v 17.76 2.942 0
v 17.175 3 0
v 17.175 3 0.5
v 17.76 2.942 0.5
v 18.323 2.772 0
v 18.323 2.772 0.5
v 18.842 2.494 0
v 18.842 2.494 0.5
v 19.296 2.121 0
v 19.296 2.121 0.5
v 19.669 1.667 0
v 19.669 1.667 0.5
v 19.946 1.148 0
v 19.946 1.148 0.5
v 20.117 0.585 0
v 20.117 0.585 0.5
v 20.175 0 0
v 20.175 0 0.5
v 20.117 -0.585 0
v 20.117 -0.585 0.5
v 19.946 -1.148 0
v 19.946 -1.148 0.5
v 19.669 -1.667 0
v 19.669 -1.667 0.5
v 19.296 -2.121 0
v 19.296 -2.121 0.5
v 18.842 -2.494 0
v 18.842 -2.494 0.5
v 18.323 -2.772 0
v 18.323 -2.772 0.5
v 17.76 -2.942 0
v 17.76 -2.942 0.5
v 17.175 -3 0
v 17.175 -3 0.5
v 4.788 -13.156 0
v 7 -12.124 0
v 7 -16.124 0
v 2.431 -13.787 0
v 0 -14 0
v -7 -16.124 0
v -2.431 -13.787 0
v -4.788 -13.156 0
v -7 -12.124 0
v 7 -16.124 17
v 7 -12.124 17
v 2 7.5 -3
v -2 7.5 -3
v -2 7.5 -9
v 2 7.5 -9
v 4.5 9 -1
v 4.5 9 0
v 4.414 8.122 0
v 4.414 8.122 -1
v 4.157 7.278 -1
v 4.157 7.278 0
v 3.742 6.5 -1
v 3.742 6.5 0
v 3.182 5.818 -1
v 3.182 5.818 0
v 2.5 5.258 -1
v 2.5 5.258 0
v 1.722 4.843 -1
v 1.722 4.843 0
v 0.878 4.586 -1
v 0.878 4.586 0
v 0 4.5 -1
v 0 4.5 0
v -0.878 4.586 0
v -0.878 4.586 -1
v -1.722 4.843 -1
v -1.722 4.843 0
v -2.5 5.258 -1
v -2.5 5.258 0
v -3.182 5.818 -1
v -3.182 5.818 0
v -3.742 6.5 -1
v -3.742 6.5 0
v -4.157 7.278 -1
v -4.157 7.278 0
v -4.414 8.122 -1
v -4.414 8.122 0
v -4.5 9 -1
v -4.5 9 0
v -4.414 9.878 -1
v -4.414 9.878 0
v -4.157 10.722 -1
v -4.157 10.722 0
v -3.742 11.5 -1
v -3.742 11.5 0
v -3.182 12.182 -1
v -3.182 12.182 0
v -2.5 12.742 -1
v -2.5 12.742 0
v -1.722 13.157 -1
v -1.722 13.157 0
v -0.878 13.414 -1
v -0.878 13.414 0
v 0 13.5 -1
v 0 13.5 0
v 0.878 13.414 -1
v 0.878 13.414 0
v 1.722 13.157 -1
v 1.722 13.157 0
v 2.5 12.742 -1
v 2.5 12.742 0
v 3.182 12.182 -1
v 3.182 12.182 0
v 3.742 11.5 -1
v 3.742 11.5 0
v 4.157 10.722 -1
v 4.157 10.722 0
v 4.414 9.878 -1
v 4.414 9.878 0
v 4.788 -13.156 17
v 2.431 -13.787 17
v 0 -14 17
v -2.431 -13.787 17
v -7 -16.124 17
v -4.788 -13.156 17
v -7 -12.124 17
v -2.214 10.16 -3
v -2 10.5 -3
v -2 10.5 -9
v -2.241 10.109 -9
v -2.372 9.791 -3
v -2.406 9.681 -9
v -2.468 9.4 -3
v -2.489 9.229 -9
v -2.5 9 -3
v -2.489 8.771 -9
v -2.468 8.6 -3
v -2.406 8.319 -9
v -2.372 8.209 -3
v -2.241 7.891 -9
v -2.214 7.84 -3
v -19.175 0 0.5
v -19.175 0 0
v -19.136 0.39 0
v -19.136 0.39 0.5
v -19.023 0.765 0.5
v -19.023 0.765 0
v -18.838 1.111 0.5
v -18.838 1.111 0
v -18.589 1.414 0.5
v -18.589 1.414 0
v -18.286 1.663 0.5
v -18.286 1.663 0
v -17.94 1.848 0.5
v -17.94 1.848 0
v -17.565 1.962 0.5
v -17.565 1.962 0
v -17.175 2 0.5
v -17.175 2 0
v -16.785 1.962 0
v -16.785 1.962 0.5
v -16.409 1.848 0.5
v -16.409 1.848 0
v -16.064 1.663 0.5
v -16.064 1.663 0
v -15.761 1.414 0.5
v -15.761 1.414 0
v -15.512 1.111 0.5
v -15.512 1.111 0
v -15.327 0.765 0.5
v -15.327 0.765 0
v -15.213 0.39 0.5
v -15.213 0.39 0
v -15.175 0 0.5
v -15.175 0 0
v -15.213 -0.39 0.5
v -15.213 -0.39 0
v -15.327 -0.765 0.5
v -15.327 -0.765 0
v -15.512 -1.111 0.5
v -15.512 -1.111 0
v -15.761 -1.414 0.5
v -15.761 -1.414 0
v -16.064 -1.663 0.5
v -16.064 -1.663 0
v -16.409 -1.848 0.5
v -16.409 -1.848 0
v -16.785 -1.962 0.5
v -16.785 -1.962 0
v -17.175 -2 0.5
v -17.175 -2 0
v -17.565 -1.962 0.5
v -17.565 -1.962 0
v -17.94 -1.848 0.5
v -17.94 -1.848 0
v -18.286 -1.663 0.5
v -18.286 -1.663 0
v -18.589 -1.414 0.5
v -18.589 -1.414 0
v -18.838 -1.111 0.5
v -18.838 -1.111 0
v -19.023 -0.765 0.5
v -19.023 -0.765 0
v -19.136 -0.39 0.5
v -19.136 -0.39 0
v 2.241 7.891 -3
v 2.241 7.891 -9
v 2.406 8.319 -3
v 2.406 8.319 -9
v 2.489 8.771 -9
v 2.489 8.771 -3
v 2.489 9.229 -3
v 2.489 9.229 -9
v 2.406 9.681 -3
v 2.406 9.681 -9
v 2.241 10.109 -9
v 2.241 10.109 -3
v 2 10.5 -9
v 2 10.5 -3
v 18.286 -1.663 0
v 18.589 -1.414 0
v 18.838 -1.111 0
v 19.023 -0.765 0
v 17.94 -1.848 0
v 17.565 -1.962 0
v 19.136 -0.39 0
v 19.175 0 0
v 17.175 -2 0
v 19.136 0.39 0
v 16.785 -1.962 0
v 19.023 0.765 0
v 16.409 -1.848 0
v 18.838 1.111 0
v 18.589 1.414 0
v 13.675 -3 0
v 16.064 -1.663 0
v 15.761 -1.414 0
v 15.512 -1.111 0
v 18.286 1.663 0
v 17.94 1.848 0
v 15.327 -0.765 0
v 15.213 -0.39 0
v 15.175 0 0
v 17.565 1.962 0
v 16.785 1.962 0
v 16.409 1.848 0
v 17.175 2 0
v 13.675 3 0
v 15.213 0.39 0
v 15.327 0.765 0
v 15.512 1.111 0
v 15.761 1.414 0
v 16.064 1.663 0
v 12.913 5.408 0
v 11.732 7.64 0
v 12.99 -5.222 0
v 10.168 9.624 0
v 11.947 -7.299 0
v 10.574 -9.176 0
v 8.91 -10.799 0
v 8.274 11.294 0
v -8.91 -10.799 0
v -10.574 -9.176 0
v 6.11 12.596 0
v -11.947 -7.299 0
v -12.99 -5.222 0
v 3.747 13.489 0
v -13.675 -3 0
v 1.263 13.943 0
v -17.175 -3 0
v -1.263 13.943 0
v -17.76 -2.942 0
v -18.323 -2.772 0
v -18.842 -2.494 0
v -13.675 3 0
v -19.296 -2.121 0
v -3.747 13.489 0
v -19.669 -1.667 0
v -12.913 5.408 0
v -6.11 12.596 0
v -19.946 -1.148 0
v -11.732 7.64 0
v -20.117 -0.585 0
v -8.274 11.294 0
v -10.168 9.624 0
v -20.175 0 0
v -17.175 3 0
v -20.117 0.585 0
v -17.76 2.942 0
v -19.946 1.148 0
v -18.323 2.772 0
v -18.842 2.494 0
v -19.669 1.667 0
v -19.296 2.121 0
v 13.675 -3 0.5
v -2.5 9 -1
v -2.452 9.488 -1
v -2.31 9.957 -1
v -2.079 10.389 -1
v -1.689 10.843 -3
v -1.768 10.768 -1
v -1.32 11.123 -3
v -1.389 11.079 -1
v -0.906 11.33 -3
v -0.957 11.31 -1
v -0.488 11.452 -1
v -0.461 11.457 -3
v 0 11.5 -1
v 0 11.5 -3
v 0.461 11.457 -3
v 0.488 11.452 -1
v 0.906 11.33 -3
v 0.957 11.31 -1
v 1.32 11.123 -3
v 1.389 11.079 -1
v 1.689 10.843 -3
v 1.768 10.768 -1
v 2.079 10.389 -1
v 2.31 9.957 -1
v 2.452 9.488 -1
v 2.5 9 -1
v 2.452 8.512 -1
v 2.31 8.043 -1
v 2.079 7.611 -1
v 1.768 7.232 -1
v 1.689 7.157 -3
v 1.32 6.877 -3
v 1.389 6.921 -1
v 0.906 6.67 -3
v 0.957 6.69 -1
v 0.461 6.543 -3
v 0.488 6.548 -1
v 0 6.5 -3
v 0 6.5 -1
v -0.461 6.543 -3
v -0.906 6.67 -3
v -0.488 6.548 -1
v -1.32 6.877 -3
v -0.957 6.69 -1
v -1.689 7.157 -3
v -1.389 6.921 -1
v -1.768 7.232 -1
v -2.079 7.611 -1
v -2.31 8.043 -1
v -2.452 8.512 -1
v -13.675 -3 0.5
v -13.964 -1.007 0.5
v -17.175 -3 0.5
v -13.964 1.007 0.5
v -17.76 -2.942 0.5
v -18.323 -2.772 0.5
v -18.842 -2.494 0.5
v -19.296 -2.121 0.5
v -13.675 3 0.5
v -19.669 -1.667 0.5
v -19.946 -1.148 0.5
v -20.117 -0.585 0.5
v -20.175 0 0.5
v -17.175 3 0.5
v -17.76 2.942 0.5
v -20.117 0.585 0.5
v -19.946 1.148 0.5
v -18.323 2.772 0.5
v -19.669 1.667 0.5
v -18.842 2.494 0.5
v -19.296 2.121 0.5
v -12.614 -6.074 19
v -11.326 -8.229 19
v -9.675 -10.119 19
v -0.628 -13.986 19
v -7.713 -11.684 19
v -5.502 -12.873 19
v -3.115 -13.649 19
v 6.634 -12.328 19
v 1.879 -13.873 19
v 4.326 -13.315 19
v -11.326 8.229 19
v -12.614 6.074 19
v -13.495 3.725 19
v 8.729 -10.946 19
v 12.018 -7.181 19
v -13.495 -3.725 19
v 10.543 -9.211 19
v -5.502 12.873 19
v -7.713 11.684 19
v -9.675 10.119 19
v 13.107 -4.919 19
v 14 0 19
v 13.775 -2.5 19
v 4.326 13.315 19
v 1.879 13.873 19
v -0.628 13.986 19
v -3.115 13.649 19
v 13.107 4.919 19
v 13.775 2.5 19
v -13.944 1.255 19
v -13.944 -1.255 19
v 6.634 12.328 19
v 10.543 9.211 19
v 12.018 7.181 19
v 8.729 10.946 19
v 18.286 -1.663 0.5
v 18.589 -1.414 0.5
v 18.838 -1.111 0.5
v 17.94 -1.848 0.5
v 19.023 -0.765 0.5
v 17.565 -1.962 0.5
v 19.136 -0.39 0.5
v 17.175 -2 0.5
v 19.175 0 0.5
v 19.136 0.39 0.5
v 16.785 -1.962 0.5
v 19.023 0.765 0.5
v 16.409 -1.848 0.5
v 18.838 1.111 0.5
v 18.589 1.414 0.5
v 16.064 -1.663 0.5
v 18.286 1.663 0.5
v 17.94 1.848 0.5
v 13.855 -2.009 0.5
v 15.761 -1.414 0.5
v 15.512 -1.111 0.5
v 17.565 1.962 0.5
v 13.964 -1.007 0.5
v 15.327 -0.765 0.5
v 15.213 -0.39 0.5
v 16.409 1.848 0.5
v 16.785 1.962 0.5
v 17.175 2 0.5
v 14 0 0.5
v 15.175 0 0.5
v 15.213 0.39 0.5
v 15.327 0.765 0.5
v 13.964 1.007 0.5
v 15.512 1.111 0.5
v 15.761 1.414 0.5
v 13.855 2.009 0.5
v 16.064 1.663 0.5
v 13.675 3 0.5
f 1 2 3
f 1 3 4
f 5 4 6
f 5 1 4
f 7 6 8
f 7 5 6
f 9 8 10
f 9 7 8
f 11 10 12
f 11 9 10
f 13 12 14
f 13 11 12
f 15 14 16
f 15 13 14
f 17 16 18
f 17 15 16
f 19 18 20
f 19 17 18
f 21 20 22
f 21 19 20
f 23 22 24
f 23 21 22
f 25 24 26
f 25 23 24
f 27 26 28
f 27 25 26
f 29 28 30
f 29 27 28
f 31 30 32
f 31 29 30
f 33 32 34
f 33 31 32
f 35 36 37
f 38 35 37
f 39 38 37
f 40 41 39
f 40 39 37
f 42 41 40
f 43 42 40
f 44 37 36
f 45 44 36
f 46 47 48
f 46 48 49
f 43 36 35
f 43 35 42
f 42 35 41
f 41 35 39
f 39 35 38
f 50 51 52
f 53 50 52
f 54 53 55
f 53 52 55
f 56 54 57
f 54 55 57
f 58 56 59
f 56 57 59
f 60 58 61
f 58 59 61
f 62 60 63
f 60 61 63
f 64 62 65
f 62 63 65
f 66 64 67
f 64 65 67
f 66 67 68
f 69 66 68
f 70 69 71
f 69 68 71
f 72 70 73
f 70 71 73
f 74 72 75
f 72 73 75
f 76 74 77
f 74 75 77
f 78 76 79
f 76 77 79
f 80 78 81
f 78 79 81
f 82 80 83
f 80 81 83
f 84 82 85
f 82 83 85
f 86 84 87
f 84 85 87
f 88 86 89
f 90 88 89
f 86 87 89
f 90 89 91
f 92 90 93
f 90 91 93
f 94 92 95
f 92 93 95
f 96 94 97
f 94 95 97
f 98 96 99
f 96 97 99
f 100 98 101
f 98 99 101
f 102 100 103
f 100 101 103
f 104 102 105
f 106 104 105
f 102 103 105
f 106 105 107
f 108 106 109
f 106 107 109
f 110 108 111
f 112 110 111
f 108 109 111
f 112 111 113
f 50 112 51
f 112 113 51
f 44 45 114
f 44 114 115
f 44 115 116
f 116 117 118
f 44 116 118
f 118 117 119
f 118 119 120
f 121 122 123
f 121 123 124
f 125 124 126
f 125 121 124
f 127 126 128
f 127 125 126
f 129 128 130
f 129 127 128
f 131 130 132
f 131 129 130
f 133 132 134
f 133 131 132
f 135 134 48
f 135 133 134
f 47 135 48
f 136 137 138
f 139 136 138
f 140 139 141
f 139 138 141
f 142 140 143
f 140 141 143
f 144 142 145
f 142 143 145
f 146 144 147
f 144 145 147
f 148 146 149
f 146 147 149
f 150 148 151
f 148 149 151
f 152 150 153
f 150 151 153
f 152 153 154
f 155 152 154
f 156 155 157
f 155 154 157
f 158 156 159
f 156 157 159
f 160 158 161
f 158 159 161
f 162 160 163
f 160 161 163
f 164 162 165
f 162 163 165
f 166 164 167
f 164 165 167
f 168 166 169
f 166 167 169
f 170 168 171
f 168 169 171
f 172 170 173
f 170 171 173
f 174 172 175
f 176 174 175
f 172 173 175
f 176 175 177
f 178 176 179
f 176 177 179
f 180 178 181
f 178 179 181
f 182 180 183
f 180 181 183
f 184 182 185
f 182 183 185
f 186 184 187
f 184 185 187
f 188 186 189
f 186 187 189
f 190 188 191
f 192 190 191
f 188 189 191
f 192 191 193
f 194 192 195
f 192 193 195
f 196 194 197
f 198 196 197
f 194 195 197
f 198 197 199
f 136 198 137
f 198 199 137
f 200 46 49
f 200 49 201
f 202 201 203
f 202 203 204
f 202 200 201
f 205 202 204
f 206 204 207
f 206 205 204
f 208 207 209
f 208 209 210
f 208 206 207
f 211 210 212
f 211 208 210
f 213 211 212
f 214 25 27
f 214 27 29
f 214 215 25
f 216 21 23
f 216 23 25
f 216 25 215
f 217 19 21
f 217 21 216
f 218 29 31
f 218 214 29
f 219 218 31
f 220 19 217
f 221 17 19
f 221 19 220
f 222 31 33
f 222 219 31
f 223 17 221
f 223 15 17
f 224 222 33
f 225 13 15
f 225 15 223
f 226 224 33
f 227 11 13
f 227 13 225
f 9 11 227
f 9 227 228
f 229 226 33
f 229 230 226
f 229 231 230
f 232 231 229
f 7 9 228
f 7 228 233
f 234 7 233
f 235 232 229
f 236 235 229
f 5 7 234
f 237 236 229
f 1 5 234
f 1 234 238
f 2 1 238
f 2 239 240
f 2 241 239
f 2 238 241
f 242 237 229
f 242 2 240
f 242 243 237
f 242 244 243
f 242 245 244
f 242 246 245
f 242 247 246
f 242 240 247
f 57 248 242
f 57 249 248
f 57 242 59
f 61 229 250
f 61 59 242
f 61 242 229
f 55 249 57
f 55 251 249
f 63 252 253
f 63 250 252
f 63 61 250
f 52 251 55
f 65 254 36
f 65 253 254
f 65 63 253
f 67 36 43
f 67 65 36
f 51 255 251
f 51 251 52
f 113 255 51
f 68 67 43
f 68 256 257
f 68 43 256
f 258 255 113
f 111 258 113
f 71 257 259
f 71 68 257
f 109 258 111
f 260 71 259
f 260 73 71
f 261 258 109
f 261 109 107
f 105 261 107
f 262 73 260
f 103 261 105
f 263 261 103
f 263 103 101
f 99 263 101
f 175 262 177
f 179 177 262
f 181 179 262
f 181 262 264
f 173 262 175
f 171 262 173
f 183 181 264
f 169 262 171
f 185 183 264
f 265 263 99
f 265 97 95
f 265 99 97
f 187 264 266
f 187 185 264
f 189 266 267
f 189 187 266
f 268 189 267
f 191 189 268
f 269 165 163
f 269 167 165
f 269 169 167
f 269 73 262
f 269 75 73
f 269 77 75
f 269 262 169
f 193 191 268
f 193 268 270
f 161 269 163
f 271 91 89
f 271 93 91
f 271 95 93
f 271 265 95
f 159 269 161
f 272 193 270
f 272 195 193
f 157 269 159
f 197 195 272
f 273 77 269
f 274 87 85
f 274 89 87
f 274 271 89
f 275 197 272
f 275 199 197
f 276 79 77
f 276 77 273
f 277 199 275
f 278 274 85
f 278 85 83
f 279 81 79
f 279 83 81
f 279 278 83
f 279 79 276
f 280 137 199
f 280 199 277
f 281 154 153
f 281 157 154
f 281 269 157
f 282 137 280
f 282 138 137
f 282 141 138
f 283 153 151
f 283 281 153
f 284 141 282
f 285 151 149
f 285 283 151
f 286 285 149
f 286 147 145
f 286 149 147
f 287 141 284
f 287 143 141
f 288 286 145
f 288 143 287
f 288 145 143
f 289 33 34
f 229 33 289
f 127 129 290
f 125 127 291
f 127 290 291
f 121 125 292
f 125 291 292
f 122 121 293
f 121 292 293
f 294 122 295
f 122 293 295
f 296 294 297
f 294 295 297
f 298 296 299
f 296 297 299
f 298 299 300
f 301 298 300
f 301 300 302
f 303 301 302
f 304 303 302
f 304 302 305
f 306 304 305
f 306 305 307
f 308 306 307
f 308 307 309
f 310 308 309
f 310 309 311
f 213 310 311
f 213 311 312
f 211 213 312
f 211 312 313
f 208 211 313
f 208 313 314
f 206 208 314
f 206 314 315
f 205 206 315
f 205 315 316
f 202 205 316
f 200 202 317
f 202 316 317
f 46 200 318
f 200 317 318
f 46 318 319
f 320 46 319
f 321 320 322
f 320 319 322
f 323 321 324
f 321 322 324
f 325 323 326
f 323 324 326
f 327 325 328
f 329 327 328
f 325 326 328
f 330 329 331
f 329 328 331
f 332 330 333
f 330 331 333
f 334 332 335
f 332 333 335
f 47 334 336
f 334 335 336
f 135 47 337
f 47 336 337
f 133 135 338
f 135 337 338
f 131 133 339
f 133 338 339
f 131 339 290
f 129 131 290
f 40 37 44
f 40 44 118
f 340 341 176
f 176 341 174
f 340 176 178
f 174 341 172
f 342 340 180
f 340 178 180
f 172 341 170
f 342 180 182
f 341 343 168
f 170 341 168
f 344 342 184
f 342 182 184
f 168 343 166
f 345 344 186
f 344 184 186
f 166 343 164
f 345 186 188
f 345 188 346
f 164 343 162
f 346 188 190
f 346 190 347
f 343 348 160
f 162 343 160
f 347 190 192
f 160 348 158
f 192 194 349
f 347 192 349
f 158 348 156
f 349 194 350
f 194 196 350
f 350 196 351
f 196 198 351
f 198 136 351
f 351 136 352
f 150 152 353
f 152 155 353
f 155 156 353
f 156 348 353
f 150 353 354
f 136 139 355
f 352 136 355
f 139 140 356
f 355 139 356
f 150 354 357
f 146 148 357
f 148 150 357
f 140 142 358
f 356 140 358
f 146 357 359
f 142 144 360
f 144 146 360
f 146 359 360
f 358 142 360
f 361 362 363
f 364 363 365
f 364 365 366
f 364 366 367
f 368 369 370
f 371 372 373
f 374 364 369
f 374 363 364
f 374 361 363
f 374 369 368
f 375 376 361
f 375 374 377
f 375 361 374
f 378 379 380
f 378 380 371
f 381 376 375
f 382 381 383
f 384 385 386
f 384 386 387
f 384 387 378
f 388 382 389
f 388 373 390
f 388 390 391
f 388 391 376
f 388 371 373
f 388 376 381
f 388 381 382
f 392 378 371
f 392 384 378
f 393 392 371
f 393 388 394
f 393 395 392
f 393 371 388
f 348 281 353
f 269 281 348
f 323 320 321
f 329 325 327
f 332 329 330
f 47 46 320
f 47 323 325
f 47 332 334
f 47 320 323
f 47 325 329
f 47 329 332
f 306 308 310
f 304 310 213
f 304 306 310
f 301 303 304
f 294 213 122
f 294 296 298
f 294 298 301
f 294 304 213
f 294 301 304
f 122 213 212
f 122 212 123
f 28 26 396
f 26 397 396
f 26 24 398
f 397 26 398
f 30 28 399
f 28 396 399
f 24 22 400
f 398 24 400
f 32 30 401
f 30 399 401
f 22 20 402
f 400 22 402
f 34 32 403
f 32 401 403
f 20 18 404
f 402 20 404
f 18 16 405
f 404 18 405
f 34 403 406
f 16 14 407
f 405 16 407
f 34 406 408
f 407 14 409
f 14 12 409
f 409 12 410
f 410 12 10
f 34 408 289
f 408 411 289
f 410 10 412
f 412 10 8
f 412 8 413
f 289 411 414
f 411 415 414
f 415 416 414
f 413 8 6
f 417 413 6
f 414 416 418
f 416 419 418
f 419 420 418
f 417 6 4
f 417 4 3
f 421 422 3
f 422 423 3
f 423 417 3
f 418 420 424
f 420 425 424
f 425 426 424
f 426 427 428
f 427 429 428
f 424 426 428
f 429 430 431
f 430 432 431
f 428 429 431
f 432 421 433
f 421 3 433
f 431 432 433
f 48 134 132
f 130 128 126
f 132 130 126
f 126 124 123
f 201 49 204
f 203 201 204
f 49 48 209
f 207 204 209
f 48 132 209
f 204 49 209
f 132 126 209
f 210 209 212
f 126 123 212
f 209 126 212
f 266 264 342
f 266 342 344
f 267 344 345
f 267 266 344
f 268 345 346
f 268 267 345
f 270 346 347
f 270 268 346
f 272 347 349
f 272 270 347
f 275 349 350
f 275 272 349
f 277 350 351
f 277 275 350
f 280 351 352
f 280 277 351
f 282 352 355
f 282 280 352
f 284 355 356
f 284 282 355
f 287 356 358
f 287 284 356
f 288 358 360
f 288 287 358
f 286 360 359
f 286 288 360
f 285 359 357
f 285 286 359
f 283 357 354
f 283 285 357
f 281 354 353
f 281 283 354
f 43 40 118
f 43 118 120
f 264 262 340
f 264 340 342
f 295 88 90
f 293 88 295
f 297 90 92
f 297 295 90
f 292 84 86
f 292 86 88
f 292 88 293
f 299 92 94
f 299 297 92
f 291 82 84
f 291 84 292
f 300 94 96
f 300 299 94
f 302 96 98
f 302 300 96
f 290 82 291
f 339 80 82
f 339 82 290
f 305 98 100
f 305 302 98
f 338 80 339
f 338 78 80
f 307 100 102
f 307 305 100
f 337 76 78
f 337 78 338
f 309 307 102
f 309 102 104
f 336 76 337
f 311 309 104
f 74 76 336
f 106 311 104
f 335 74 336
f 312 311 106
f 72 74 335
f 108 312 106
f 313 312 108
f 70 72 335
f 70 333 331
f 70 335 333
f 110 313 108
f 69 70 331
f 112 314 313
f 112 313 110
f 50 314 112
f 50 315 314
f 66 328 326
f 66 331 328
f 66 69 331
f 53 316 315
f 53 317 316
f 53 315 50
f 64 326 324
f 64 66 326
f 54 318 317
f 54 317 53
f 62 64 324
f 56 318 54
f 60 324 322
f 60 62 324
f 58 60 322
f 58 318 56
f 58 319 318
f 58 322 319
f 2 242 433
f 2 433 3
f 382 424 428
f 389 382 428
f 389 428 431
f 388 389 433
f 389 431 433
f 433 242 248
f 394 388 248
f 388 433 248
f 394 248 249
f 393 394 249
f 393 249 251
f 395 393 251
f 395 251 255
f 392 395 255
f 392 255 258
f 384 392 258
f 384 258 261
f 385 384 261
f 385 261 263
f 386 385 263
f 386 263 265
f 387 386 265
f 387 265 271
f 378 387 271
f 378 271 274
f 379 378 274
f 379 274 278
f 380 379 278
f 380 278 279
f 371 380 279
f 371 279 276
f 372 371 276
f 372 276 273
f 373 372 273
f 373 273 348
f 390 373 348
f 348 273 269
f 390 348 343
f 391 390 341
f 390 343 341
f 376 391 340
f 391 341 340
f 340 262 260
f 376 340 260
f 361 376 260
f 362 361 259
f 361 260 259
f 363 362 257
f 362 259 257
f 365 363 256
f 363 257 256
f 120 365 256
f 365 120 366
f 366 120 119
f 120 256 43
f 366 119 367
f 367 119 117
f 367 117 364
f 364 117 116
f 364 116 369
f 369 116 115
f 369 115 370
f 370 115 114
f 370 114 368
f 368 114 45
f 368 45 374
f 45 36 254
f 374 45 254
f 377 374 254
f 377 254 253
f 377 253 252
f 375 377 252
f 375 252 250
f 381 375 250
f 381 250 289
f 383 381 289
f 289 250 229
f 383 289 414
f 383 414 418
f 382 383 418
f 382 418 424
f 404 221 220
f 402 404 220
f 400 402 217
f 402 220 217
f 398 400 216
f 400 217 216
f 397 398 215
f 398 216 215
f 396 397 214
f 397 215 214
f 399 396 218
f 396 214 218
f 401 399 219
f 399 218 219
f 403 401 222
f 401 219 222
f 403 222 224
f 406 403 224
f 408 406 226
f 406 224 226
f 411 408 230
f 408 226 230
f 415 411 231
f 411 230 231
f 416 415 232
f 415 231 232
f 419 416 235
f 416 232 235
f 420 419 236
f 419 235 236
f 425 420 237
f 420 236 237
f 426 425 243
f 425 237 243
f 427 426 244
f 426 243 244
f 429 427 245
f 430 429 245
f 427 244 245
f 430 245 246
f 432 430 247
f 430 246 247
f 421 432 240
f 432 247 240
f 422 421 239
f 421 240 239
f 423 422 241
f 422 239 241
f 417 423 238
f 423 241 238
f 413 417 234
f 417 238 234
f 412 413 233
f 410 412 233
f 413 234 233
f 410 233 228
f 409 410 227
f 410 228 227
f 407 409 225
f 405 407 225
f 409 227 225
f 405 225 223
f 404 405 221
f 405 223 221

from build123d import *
from build123d.topology import SkipClean

# Parameters (mm, degrees)
SKETCH1_R           = 14
BOSS_EXTRUDE1_DEPTH = 19
SKETCH2_R           = 2
BOSS_EXTRUDE2_DEPTH = 0.5
SKETCH3_R           = 4.5
BOSS_EXTRUDE3_DEPTH = 1
SKETCH4_R           = 2.5
BOSS_EXTRUDE4_DEPTH = 2
BOSS_EXTRUDE5_DEPTH = 6
SKETCH6_W           = 14
SKETCH6_H           = 4
BOSS_EXTRUDE6_DEPTH = 17


with BuildPart() as part:
    # Sketch1 → Boss-Extrude1 (new body)
    with BuildSketch(Plane.XY):
        Circle(SKETCH1_R)
    extrude(amount=BOSS_EXTRUDE1_DEPTH)

    # Sketch2 → Boss-Extrude2 (add)
    # profile 1 of 2: a face of its own
    with BuildSketch(Plane(origin=(0, 0, 0), x_dir=(-1, 0, 0), z_dir=(0, 0, -1))):
        with BuildLine():
            Line((17.174794331, 3), (13.674794331, 3))
            ThreePointArc((13.674794331, 3), (14, 0), (13.674794331, -3))
            Line((13.674794331, -3), (17.174794331, -3))
            ThreePointArc((17.174794331, -3), (20.174794331, 0), (17.174794331, 3))
        make_face()
        with Locations((17.174794331, 0)):
            Circle(SKETCH2_R, mode=Mode.SUBTRACT)
    # profile 2 of 2: a face of its own
    with BuildSketch(Plane(origin=(0, 0, 0), x_dir=(-1, 0, 0), z_dir=(0, 0, -1))):
        with BuildLine():
            Line((-17.174794331, -3), (-13.674794331, -3))
            ThreePointArc((-13.674794331, -3), (-14, 0), (-13.674794331, 3))
            Line((-13.674794331, 3), (-17.174794331, 3))
            ThreePointArc((-17.174794331, 3), (-20.174794331, 0), (-17.174794331, -3))
        make_face()
        with Locations(Location((-17.174794331, 0, 0), (0, 0, 180))):
            Circle(SKETCH2_R, mode=Mode.SUBTRACT)
    extrude(amount=-BOSS_EXTRUDE2_DEPTH)

    # Sketch3 → Boss-Extrude3 (add)
    with BuildSketch(Plane(origin=(0, 0, 0), x_dir=(-1, 0, 0), z_dir=(0, 0, -1))):
        with Locations(Location((0, 9, 0), (0, 0, 180))):
            Circle(SKETCH3_R)
    extrude(amount=BOSS_EXTRUDE3_DEPTH)

    # Sketch4 → Boss-Extrude4 (add)
    with BuildSketch(Plane(origin=(0, 0, -1), x_dir=(-1, 0, 0), z_dir=(0, 0, -1))):
        with Locations((0, 9)):
            Circle(SKETCH4_R)
    extrude(amount=BOSS_EXTRUDE4_DEPTH)

    # Sketch5 → Boss-Extrude5 (add)
    with SkipClean():  # the faces are left unmerged after this step: merging them gives an invalid solid
        with BuildSketch(Plane(origin=(0, 0, -3), x_dir=(-1, 0, 0), z_dir=(0, 0, -1))):
            with BuildLine():
                Line((-2, 10.5), (2, 10.5))
                ThreePointArc((2, 10.5), (2.5, 9), (2, 7.5))
                Line((2, 7.5), (-2, 7.5))
                ThreePointArc((-2, 7.5), (-2.5, 9), (-2, 10.5))
            make_face()
        extrude(amount=BOSS_EXTRUDE5_DEPTH)

    # Sketch6 → Boss-Extrude6 (add)
    with SkipClean():  # the faces are left unmerged after this step: merging them gives an invalid solid
        with BuildSketch(Plane(origin=(0, 0, 0), x_dir=(-1, 0, 0), z_dir=(0, 0, -1))):
            with Locations((0, -14.124355653)):
                Rectangle(SKETCH6_W, SKETCH6_H)
        extrude(amount=-BOSS_EXTRUDE6_DEPTH)


solid = part.part
